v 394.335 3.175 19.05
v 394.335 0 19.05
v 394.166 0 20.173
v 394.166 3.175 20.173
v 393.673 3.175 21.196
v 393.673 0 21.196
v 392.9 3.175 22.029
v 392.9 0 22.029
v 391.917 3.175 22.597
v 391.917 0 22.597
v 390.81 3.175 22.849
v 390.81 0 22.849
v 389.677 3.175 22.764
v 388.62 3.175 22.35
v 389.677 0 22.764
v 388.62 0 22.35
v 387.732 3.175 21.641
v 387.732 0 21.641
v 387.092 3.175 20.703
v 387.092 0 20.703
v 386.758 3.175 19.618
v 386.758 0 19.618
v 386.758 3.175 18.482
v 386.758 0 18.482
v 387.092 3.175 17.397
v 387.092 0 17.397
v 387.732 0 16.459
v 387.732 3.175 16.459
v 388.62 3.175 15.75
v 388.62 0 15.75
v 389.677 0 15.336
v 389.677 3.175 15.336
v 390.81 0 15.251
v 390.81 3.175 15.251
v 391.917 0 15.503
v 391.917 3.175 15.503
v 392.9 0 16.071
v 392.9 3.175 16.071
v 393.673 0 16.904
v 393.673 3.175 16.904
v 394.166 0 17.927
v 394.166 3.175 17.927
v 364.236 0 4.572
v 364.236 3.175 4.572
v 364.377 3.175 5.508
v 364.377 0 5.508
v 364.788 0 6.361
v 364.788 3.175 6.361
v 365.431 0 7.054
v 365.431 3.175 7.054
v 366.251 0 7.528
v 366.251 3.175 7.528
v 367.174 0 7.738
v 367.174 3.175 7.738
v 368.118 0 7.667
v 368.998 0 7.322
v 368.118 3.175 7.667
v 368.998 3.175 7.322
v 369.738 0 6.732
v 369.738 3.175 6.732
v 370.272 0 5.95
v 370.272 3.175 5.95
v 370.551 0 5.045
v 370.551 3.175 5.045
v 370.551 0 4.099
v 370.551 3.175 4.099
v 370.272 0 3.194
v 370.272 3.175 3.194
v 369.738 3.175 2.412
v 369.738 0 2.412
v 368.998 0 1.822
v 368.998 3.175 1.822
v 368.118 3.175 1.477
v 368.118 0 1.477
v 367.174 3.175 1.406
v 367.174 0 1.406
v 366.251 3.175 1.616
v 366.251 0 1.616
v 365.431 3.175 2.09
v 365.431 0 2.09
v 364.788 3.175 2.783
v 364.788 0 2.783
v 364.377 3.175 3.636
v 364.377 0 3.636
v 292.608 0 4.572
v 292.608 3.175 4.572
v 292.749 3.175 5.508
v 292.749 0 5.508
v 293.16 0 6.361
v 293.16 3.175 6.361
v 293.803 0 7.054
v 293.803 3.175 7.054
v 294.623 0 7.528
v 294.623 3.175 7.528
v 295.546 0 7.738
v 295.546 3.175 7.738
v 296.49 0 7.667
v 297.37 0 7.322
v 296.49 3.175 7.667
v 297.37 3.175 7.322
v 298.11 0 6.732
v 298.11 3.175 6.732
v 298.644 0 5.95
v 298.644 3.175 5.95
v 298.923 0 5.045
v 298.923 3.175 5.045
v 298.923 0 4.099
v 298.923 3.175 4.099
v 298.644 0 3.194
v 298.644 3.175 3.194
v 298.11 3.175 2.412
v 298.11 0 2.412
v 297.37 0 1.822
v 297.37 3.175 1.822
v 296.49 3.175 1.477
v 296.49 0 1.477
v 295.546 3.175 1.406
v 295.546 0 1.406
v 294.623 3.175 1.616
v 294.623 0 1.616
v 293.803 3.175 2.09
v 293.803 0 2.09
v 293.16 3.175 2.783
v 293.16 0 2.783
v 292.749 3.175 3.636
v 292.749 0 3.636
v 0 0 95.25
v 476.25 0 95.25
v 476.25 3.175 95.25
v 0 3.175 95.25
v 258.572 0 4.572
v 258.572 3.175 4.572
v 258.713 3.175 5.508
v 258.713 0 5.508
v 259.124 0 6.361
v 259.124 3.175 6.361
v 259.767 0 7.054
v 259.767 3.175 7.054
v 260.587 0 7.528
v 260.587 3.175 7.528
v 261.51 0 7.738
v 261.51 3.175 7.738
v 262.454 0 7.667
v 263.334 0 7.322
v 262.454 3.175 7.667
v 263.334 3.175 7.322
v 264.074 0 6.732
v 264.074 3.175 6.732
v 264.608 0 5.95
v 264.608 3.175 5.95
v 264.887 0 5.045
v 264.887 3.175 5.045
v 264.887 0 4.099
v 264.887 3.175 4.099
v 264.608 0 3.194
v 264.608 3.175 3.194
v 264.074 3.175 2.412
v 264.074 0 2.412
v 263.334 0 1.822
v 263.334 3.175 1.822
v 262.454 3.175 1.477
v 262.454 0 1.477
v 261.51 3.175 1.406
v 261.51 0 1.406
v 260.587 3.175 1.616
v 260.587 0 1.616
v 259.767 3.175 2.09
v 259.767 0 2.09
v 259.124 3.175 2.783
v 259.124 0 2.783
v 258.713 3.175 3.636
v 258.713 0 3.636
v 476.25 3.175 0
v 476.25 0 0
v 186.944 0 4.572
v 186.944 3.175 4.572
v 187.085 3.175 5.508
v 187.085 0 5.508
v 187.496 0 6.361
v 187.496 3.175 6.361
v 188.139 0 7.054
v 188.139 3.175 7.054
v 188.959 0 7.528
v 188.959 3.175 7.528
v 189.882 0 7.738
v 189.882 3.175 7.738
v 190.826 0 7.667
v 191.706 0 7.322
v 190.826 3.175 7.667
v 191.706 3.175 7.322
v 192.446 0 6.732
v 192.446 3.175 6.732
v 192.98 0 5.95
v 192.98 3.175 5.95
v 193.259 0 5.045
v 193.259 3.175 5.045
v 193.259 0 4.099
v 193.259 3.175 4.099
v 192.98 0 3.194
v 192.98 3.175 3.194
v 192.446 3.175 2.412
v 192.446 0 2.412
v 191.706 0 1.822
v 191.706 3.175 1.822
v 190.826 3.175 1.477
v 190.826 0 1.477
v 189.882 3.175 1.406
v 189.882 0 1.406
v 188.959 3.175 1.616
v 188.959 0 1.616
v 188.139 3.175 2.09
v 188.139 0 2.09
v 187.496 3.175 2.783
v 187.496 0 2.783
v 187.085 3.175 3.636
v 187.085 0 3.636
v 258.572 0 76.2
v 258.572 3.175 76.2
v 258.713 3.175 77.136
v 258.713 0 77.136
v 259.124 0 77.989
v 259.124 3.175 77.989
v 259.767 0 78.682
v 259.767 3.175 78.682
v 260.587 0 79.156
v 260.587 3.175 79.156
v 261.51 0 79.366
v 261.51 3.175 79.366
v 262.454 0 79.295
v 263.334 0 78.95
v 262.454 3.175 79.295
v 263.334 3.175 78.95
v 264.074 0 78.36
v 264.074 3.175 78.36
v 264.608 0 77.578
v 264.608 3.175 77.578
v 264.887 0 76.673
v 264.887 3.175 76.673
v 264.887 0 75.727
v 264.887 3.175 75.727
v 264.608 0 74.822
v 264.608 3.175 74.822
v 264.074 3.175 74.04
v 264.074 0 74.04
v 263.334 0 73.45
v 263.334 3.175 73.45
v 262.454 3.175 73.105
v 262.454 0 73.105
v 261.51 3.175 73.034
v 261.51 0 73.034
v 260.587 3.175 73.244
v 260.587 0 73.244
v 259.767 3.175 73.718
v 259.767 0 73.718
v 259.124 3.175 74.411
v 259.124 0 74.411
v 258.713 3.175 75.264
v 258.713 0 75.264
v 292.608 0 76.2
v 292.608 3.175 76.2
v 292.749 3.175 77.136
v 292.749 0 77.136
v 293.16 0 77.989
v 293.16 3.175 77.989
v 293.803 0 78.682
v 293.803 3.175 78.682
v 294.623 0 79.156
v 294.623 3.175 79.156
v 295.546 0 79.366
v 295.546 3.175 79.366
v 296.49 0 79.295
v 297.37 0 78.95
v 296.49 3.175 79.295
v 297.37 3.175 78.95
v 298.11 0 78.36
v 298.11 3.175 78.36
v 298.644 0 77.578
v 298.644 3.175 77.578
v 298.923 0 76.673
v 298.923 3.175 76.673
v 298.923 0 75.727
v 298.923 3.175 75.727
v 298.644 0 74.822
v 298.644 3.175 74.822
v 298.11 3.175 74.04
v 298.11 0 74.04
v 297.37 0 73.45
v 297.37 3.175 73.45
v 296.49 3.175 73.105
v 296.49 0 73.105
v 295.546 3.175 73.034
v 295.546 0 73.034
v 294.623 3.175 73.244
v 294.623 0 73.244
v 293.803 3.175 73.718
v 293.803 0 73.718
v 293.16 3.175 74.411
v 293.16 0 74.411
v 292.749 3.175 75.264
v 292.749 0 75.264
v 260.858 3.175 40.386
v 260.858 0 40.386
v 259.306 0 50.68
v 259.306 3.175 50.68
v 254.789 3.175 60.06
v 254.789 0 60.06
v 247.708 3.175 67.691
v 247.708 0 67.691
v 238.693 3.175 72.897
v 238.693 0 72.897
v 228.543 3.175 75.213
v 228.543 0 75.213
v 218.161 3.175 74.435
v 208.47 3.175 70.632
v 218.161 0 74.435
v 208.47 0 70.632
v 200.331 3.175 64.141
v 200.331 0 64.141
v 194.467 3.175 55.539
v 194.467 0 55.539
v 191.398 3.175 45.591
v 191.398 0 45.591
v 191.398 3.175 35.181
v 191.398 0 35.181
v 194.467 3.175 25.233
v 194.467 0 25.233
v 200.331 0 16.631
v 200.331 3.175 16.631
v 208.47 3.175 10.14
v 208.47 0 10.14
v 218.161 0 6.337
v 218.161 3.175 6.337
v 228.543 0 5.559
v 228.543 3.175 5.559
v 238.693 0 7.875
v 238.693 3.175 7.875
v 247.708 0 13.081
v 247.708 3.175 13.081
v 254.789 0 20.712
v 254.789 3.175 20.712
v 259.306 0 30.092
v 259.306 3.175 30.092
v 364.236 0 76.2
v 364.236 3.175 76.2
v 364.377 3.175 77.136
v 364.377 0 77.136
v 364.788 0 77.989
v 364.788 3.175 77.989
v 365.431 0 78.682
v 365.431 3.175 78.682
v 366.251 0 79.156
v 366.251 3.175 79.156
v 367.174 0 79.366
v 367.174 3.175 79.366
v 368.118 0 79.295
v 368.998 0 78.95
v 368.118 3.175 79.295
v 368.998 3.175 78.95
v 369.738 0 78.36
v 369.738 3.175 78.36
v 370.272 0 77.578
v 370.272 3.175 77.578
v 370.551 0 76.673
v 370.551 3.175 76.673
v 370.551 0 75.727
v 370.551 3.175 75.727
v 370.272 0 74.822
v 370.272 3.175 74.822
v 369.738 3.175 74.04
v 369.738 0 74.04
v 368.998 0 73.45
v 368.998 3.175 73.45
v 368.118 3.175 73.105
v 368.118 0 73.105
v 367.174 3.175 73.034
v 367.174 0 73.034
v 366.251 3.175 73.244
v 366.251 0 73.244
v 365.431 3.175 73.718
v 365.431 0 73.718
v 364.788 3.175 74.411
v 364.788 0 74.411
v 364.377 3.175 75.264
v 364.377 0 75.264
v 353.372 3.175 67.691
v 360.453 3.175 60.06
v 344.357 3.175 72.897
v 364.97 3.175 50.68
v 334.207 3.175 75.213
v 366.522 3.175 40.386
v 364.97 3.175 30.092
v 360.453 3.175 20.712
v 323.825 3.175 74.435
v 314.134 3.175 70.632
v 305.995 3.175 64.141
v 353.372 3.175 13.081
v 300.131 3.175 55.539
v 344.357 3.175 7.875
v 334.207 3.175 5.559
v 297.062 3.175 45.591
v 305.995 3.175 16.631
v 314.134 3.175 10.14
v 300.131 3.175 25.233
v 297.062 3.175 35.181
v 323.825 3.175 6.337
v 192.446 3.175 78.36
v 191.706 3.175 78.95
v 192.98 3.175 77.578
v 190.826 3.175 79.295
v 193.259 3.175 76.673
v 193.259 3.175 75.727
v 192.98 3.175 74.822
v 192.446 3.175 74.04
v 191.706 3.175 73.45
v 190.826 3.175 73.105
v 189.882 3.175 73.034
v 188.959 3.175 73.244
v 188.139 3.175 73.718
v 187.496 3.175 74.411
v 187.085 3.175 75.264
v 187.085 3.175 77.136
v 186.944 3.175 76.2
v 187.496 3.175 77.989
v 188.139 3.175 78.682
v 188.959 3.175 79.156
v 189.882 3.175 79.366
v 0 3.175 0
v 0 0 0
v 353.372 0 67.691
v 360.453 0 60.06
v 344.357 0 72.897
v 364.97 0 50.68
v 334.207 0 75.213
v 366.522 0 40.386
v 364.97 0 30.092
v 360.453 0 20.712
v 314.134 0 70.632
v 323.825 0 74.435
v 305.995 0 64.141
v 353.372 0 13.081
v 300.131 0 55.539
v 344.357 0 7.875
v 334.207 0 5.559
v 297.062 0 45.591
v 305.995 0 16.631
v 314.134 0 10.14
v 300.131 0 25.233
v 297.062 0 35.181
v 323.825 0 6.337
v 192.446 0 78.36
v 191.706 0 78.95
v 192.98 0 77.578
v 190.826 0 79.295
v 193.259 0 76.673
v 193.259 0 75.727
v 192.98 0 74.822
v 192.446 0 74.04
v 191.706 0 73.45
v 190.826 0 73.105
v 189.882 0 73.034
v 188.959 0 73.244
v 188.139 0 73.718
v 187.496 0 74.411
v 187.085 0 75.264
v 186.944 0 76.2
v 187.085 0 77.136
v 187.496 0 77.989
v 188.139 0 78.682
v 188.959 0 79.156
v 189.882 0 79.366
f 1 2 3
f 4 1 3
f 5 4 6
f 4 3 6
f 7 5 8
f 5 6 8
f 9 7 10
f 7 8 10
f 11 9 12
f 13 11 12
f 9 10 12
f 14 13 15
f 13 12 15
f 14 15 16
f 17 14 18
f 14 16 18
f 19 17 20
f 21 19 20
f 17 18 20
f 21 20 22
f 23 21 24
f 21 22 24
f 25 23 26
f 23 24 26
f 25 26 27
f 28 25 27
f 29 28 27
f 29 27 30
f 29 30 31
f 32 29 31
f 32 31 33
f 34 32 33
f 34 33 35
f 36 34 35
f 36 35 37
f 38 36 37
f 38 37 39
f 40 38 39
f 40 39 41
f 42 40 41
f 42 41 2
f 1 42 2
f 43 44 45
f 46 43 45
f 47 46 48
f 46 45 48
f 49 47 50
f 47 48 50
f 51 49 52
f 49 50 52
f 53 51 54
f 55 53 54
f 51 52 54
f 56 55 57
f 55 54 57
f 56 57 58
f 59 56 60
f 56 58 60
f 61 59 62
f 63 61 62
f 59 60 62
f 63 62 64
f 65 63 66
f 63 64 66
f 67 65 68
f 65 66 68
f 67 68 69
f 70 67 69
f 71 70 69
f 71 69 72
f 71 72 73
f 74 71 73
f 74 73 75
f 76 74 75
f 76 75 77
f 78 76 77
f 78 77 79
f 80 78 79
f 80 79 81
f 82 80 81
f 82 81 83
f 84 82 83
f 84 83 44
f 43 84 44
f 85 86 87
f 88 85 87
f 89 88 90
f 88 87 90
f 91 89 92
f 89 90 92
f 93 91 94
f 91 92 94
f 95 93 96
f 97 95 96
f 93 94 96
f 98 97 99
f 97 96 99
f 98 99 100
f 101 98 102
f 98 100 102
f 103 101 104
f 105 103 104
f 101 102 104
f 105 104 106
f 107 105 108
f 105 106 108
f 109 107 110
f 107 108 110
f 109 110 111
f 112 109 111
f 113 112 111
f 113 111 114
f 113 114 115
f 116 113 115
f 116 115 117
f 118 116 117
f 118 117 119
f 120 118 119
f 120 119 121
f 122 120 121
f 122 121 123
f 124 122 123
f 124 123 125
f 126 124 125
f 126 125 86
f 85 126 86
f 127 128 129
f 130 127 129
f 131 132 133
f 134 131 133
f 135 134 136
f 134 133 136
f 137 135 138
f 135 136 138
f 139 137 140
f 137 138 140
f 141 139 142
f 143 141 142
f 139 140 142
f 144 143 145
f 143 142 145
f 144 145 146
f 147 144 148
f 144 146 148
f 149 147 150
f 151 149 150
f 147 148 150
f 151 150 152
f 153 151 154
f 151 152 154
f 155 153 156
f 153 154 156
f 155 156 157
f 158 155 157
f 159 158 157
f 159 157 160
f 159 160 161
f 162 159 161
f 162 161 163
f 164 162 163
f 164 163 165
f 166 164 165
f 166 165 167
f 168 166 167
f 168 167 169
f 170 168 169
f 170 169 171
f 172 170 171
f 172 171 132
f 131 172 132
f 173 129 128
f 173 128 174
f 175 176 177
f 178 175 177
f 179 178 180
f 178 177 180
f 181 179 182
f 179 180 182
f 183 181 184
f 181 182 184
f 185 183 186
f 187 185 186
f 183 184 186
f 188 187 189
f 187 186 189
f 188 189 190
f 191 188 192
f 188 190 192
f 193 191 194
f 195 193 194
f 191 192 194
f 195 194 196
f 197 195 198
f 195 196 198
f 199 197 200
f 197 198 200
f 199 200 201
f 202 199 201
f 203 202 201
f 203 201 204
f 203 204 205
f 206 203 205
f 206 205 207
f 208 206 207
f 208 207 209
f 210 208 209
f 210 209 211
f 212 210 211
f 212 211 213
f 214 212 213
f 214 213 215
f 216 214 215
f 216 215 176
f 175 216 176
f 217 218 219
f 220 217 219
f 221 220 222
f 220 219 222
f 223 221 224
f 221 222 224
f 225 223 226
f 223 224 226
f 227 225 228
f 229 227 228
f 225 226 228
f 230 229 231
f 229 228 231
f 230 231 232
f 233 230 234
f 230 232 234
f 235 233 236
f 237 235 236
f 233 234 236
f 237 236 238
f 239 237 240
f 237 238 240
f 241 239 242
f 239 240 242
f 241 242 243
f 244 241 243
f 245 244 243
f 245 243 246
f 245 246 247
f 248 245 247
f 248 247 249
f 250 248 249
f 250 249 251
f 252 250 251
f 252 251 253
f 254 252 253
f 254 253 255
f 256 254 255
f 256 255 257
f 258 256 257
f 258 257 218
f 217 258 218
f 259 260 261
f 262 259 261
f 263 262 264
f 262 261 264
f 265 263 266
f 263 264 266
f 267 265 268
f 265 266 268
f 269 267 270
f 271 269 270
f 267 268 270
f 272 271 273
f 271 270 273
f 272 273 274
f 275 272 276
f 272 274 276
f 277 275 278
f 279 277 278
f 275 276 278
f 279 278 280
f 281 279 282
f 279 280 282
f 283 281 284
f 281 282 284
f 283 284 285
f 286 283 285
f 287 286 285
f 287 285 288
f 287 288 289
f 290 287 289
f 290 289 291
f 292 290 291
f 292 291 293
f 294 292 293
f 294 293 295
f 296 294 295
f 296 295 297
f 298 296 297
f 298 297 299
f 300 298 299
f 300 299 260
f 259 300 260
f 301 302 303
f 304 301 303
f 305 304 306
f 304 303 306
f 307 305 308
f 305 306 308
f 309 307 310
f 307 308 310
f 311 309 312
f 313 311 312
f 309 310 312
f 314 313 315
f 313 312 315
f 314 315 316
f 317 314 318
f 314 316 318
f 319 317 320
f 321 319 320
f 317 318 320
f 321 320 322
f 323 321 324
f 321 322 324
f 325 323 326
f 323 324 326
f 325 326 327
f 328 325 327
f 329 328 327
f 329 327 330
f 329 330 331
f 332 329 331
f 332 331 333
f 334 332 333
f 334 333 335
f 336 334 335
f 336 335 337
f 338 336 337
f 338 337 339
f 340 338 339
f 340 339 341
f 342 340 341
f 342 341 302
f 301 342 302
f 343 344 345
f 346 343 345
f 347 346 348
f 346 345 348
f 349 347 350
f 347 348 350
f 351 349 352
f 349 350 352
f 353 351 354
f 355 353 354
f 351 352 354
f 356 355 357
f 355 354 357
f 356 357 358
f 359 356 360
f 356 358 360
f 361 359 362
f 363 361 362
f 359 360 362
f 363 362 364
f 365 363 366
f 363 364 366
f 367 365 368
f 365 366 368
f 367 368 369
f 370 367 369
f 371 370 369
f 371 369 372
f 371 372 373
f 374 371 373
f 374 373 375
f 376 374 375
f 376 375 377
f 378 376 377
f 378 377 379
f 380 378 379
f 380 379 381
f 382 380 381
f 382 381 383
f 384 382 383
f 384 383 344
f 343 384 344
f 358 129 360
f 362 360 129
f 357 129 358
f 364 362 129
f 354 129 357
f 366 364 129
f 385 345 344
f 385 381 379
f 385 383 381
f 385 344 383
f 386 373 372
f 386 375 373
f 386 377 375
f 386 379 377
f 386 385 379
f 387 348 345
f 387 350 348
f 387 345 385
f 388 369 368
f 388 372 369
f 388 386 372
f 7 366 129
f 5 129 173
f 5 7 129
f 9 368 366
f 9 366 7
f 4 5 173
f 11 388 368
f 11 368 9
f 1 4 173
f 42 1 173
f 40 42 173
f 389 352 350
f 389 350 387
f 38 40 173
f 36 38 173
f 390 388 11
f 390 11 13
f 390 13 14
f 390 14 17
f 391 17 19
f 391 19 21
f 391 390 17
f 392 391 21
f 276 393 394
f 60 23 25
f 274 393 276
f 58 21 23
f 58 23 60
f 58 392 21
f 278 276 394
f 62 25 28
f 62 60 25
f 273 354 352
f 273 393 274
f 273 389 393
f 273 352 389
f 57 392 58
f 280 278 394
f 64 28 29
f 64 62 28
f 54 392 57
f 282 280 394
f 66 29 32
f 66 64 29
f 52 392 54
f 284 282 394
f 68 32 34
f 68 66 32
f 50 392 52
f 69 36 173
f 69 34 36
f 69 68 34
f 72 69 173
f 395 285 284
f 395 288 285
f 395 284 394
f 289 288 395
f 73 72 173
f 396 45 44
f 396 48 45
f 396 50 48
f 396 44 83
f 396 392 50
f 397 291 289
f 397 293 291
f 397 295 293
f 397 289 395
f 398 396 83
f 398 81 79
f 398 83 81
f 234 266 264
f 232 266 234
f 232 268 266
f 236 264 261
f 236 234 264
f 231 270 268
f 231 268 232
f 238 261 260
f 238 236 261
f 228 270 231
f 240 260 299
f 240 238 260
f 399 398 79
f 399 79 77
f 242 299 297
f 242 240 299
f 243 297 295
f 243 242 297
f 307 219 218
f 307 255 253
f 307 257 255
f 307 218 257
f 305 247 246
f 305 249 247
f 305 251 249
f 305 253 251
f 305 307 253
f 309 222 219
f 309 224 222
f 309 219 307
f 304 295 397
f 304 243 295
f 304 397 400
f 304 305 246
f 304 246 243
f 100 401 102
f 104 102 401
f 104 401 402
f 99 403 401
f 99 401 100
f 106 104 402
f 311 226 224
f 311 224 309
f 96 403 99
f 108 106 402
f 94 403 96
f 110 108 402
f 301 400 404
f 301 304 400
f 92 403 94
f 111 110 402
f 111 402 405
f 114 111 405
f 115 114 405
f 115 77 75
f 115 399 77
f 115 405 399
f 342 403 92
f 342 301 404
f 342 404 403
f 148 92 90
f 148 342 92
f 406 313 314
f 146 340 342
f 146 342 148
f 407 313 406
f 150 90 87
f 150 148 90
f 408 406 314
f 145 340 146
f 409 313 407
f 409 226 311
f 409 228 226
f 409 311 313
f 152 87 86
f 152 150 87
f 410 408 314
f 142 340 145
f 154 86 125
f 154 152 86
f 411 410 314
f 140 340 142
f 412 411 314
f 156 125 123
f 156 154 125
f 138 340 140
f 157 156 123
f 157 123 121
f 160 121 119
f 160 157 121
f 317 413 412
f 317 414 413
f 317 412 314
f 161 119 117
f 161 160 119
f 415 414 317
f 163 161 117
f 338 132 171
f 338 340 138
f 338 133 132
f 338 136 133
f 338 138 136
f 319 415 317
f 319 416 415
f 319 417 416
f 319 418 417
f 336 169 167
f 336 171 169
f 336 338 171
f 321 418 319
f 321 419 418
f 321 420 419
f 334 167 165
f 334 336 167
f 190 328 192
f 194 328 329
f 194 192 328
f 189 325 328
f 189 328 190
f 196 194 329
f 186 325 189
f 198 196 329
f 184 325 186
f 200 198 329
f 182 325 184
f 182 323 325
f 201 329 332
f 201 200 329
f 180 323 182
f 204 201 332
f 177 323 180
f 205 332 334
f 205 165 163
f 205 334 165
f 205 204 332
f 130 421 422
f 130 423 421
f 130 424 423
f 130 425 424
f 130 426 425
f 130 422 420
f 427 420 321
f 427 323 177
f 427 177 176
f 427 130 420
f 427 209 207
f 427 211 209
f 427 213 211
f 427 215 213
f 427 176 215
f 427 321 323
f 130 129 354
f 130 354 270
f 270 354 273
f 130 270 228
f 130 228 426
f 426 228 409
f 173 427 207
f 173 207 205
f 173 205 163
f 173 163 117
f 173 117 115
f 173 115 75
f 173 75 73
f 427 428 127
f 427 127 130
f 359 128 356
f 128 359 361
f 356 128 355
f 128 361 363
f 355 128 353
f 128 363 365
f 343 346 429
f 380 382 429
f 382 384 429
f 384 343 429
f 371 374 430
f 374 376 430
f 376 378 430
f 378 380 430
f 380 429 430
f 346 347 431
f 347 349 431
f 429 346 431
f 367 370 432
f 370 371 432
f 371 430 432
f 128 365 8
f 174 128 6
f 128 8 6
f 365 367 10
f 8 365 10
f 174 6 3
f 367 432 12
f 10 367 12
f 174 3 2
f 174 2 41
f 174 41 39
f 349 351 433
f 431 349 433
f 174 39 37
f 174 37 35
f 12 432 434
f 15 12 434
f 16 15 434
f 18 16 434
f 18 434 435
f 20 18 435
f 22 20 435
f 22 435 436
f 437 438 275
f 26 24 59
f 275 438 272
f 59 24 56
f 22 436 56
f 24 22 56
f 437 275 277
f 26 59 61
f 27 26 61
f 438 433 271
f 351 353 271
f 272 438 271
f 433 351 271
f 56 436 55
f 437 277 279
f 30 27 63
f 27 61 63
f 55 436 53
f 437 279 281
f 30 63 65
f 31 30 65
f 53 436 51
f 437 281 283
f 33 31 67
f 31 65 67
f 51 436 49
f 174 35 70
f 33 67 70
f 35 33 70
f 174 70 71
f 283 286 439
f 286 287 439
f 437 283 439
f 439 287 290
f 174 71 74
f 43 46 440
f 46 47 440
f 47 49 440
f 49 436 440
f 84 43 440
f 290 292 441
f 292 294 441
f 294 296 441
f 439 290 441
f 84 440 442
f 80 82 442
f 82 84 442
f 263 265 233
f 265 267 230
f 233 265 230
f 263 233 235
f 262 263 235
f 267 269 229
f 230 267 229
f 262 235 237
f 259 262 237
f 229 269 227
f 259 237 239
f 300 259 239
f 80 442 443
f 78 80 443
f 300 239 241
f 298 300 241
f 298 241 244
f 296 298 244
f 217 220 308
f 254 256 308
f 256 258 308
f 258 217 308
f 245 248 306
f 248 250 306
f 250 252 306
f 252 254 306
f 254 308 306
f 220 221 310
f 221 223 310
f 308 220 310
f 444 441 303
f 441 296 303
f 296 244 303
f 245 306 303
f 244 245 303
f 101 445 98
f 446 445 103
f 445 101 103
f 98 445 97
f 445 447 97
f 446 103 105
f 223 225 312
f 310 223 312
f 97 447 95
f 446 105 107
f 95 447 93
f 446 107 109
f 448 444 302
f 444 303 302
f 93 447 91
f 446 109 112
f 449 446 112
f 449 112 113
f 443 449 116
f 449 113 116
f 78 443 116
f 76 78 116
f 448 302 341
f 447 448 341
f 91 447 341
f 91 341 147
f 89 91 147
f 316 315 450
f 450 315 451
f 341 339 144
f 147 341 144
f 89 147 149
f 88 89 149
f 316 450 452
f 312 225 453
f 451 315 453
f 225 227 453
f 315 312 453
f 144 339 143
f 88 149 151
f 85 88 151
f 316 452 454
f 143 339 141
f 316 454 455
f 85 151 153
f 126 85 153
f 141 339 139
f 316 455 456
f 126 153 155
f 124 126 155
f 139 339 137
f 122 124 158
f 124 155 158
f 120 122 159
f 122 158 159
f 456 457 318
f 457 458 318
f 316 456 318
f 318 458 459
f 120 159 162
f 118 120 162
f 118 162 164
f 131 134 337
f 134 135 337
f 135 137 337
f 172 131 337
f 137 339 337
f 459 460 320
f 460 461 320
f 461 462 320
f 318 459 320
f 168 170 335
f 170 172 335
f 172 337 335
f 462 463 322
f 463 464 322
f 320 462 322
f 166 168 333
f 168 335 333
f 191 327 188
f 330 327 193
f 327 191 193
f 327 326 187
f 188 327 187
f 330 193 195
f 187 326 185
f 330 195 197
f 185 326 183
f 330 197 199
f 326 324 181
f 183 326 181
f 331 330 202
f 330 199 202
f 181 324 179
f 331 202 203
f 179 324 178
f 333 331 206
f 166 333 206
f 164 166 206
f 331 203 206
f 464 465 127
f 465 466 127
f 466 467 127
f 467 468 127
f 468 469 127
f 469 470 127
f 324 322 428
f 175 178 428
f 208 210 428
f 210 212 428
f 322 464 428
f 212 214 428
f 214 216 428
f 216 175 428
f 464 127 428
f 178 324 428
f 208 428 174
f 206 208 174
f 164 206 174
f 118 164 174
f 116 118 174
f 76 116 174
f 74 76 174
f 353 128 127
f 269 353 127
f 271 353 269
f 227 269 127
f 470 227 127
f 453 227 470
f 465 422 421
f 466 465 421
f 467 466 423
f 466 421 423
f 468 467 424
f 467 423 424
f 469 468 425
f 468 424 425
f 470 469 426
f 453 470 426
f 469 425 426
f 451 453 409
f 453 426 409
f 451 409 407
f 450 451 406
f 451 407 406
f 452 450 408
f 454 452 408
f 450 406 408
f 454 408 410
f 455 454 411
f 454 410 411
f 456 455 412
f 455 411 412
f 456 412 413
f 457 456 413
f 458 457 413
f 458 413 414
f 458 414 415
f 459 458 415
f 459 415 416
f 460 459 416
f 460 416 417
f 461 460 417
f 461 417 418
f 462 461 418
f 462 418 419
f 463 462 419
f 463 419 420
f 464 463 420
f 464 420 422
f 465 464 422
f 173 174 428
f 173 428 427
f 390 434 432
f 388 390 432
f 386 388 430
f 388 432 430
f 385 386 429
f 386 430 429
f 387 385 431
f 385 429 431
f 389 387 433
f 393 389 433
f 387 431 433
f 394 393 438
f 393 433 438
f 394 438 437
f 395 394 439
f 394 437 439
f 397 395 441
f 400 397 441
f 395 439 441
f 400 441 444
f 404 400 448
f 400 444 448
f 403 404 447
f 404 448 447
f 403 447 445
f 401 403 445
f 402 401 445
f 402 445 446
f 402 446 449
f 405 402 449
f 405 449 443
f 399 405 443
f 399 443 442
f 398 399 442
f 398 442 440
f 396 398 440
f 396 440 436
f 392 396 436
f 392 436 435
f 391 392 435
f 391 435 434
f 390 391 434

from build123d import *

# Parameters (mm, degrees)
BOSS_EXTRUDE1_DEPTH = 95.25
SKETCH2_R           = 3.175
CUT_EXTRUDE1_DEPTH  = 152.4
SKETCH4_R           = 34.925
SKETCH4_R_2         = 3.81
CUT_EXTRUDE2_DEPTH  = 381
SKETCH5_R           = 3.81
CUT_EXTRUDE3_DEPTH  = 12.7
SKETCH6_W           = 95.25
SKETCH6_H           = 377.825
CUT_EXTRUDE4_DEPTH  = 613.404745654
SKETCH7_W           = 95.25
SKETCH7_H           = 3.175
BOSS_EXTRUDE2_DEPTH = 3.175


with BuildPart() as part:
    # Sketch1 → Boss-Extrude1 (new body)
    with BuildSketch(Plane.XY):
        Polygon((0, 0), (0, 381), (3.175, 381), (3.175, 3.175), (473.075, 3.175), (473.075, 0), align=None)
    extrude(amount=BOSS_EXTRUDE1_DEPTH)

    # Sketch2 → Cut-Extrude1 (cut)
    with BuildSketch(Plane(origin=(0, 3.175, 0), x_dir=(1, 0, 0), z_dir=(0, 1, 0))):
        with Locations(Location((190.119, -4.572, 0), (0, 0, 180))):
            Circle(SKETCH2_R)
        with Locations(Location((190.119, -76.2, 0), (0, 0, 180))):
            Circle(SKETCH2_R)
        with Locations(Location((261.747, -4.572, 0), (0, 0, 180))):
            Circle(SKETCH2_R)
        with Locations(Location((261.747, -76.2, 0), (0, 0, 180))):
            Circle(SKETCH2_R)
        with Locations(Location((295.783, -76.2, 0), (0, 0, 180))):
            Circle(SKETCH2_R)
        with Locations(Location((295.783, -4.572, 0), (0, 0, 180))):
            Circle(SKETCH2_R)
        with Locations(Location((367.411, -76.2, 0), (0, 0, 180))):
            Circle(SKETCH2_R)
        with Locations(Location((367.411, -4.572, 0), (0, 0, 180))):
            Circle(SKETCH2_R)
    extrude(amount=-CUT_EXTRUDE1_DEPTH, mode=Mode.SUBTRACT)

    # Sketch4 → Cut-Extrude2 (cut)
    with BuildSketch(Plane.XZ):
        with Locations((225.933, 40.386)):
            Circle(SKETCH4_R)
        with Locations((331.597, 40.386)):
            Circle(SKETCH4_R)
        with Locations((390.525, 19.05)):
            Circle(SKETCH4_R_2)
    extrude(amount=-CUT_EXTRUDE2_DEPTH, mode=Mode.SUBTRACT)

    # Sketch5 → Cut-Extrude3 (cut)
    with BuildSketch(Plane.ZY):
        with Locations((19.05, 349.25)):
            Circle(SKETCH5_R)
    extrude(amount=-CUT_EXTRUDE3_DEPTH, mode=Mode.SUBTRACT)

    # Sketch6 → Cut-Extrude4 (cut, through all)
    with BuildSketch(Plane(origin=(3.175, 0, 0), x_dir=(0, 0, -1), z_dir=(1, 0, 0))):
        with Locations((-47.625, 192.0875)):
            Rectangle(SKETCH6_W, SKETCH6_H)
    extrude(amount=-CUT_EXTRUDE4_DEPTH, mode=Mode.SUBTRACT)

    # Sketch7 → Boss-Extrude2 (add)
    with BuildSketch(Plane(origin=(473.075, 0, 0), x_dir=(0, 0, -1), z_dir=(1, 0, 0))):
        with Locations((-47.625, 1.5875)):
            Rectangle(SKETCH7_W, SKETCH7_H)
    extrude(amount=BOSS_EXTRUDE2_DEPTH)


solid = part.part
